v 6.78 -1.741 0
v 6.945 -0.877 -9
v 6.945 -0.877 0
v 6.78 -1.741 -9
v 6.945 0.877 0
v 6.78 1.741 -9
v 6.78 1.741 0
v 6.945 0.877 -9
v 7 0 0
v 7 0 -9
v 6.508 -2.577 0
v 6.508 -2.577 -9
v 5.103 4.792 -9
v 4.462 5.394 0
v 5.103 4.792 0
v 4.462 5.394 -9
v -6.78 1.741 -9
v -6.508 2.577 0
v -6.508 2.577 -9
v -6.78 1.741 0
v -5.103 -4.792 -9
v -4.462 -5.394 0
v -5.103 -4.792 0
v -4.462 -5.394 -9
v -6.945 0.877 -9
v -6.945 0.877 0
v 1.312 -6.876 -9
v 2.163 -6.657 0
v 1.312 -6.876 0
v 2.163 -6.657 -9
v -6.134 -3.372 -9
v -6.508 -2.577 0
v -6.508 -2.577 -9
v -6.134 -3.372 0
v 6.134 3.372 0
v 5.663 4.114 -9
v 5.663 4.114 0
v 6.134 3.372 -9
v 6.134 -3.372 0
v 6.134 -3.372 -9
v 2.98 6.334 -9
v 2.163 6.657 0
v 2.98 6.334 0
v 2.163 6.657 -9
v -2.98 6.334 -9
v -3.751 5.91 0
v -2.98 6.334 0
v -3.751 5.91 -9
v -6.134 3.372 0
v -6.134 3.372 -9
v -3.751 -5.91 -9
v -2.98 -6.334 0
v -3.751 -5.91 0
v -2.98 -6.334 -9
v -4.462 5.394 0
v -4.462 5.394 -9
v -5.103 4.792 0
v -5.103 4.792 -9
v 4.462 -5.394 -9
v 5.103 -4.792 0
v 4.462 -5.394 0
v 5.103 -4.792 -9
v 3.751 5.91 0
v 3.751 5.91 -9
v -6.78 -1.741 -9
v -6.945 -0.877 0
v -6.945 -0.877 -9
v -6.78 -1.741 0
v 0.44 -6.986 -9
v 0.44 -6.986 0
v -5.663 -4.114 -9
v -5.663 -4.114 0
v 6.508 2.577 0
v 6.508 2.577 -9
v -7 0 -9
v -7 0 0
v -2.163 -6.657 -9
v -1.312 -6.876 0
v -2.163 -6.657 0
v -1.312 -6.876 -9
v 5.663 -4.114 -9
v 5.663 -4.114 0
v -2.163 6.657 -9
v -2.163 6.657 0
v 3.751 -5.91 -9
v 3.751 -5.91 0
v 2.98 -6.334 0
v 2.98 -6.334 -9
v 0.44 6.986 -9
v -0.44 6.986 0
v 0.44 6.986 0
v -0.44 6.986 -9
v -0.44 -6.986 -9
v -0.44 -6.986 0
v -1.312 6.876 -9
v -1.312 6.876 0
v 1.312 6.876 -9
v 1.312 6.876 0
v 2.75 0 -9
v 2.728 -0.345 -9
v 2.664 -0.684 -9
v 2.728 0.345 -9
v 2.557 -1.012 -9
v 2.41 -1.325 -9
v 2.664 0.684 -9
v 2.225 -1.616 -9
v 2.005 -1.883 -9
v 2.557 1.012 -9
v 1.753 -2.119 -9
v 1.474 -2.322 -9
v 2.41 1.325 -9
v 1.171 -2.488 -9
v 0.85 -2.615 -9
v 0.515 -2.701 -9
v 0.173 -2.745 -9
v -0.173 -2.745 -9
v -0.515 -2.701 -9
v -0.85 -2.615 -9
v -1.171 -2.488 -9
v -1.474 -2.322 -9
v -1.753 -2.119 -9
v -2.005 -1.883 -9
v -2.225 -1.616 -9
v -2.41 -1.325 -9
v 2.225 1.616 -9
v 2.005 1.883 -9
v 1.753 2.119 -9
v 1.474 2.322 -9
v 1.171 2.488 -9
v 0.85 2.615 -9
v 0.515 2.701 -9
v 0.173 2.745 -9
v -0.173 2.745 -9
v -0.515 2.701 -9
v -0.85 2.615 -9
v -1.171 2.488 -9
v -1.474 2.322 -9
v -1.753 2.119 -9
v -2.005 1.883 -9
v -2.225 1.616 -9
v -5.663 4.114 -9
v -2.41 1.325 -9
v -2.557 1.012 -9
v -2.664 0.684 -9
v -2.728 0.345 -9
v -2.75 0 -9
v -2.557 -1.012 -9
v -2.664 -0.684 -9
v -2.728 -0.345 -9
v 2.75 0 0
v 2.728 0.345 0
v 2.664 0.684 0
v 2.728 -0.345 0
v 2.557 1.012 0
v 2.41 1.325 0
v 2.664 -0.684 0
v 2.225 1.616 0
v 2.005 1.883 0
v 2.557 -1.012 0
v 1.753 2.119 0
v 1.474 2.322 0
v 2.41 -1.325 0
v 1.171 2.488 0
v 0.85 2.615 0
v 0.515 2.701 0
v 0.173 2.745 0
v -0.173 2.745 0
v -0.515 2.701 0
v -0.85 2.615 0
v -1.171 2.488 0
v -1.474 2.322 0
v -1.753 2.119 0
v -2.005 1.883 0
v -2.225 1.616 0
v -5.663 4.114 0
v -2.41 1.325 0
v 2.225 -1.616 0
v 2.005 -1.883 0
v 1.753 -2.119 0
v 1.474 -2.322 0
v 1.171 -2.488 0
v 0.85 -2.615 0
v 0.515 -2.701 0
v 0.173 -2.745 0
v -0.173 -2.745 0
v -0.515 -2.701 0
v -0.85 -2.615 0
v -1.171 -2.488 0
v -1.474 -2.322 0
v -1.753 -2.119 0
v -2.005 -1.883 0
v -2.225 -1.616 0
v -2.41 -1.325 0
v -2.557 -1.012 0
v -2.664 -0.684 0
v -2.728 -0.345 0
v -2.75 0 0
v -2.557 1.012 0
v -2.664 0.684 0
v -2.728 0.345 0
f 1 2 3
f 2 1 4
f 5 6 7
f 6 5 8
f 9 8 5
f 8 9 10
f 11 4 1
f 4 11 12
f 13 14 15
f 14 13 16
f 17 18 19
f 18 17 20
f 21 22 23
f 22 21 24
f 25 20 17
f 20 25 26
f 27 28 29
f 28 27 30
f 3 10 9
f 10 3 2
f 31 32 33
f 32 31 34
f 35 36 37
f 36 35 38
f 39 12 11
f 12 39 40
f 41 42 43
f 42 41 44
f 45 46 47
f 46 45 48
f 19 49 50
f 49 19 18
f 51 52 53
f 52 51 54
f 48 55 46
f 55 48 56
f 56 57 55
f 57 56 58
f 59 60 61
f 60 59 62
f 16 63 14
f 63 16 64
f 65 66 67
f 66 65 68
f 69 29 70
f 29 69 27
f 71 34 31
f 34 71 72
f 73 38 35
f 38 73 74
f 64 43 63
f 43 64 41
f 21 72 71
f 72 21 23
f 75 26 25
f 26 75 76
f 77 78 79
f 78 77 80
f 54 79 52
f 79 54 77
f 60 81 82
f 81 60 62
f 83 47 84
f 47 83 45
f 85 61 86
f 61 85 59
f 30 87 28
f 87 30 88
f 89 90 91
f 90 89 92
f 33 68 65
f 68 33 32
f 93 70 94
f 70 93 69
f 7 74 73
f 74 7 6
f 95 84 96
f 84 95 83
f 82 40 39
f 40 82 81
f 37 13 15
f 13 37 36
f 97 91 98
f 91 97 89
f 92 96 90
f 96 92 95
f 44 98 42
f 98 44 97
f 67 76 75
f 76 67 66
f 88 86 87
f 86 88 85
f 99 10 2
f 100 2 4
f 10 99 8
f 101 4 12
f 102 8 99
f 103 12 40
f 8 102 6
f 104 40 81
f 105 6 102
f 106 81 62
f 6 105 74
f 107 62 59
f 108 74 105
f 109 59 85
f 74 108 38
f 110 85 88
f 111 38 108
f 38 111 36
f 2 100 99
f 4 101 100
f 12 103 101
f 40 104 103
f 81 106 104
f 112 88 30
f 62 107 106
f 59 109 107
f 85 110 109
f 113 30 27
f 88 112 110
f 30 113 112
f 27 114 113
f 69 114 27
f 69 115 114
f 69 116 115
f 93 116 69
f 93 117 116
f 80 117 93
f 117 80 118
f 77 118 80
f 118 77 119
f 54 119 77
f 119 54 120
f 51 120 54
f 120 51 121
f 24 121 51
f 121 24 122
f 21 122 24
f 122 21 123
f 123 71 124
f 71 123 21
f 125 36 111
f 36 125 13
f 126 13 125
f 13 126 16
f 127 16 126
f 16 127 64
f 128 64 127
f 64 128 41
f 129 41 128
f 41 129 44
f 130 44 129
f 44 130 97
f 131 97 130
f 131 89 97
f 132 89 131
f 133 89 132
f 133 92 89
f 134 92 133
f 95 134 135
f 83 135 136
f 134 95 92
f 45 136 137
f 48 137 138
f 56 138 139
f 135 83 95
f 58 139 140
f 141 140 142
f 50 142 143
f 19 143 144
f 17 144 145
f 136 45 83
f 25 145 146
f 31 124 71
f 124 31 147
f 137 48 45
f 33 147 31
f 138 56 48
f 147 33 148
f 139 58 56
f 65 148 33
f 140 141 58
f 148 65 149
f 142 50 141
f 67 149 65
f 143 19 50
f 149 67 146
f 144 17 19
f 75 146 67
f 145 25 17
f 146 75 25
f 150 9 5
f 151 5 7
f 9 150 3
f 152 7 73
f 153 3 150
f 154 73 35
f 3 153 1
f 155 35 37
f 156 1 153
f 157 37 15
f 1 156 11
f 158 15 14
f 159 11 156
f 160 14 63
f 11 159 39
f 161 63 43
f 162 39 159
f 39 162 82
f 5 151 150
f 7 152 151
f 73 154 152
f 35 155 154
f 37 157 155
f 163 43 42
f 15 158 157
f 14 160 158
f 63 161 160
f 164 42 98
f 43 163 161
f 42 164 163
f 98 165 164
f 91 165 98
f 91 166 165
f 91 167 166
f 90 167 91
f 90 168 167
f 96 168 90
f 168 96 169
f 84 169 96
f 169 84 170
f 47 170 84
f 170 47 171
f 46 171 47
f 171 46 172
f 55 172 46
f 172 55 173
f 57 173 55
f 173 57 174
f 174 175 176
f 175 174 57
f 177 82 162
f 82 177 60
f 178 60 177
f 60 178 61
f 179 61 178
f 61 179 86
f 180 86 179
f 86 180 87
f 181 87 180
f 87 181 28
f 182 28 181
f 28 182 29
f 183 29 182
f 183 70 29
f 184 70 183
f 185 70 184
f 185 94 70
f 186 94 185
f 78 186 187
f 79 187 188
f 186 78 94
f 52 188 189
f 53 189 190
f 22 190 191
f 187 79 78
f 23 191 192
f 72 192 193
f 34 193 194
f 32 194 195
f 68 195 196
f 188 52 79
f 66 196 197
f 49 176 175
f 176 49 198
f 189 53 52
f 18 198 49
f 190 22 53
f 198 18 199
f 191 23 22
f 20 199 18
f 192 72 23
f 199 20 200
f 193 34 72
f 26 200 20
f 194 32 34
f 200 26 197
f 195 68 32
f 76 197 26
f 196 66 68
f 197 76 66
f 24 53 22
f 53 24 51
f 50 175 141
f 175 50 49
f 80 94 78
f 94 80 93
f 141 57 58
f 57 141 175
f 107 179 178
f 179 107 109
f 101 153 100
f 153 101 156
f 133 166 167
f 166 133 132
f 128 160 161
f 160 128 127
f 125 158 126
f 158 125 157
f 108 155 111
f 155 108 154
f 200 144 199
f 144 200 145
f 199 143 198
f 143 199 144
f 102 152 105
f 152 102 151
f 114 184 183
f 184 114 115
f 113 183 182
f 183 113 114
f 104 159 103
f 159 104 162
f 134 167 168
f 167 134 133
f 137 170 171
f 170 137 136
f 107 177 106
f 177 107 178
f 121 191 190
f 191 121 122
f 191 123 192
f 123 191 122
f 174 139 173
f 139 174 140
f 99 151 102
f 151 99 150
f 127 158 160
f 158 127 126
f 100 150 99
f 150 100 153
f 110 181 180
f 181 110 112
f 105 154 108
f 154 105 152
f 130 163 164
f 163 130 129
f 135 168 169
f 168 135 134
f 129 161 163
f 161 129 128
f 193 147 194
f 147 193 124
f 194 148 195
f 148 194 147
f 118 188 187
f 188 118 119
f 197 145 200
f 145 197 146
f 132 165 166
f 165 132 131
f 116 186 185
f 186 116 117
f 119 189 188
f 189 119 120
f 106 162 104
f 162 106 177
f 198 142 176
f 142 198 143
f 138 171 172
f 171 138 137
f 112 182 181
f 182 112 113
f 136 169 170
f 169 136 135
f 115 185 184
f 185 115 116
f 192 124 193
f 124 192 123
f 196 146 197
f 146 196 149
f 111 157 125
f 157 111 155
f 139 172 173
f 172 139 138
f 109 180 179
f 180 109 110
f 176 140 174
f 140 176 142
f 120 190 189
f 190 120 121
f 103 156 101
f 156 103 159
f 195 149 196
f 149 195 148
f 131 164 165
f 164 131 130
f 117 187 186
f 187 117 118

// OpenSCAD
$fn = 50;


difference() {
	union() {
		translate(v = [0, 0, -9.0000000000]) {
			cylinder(h = 9, r = 7.0000000000);
		}
		cylinder(h = 0, r = 16.0000000000);
	}
	union() {
		#translate(v = [0, 0, -9]) {
			cylinder(h = 9, r = 2.7500000000);
		}
	}
}
